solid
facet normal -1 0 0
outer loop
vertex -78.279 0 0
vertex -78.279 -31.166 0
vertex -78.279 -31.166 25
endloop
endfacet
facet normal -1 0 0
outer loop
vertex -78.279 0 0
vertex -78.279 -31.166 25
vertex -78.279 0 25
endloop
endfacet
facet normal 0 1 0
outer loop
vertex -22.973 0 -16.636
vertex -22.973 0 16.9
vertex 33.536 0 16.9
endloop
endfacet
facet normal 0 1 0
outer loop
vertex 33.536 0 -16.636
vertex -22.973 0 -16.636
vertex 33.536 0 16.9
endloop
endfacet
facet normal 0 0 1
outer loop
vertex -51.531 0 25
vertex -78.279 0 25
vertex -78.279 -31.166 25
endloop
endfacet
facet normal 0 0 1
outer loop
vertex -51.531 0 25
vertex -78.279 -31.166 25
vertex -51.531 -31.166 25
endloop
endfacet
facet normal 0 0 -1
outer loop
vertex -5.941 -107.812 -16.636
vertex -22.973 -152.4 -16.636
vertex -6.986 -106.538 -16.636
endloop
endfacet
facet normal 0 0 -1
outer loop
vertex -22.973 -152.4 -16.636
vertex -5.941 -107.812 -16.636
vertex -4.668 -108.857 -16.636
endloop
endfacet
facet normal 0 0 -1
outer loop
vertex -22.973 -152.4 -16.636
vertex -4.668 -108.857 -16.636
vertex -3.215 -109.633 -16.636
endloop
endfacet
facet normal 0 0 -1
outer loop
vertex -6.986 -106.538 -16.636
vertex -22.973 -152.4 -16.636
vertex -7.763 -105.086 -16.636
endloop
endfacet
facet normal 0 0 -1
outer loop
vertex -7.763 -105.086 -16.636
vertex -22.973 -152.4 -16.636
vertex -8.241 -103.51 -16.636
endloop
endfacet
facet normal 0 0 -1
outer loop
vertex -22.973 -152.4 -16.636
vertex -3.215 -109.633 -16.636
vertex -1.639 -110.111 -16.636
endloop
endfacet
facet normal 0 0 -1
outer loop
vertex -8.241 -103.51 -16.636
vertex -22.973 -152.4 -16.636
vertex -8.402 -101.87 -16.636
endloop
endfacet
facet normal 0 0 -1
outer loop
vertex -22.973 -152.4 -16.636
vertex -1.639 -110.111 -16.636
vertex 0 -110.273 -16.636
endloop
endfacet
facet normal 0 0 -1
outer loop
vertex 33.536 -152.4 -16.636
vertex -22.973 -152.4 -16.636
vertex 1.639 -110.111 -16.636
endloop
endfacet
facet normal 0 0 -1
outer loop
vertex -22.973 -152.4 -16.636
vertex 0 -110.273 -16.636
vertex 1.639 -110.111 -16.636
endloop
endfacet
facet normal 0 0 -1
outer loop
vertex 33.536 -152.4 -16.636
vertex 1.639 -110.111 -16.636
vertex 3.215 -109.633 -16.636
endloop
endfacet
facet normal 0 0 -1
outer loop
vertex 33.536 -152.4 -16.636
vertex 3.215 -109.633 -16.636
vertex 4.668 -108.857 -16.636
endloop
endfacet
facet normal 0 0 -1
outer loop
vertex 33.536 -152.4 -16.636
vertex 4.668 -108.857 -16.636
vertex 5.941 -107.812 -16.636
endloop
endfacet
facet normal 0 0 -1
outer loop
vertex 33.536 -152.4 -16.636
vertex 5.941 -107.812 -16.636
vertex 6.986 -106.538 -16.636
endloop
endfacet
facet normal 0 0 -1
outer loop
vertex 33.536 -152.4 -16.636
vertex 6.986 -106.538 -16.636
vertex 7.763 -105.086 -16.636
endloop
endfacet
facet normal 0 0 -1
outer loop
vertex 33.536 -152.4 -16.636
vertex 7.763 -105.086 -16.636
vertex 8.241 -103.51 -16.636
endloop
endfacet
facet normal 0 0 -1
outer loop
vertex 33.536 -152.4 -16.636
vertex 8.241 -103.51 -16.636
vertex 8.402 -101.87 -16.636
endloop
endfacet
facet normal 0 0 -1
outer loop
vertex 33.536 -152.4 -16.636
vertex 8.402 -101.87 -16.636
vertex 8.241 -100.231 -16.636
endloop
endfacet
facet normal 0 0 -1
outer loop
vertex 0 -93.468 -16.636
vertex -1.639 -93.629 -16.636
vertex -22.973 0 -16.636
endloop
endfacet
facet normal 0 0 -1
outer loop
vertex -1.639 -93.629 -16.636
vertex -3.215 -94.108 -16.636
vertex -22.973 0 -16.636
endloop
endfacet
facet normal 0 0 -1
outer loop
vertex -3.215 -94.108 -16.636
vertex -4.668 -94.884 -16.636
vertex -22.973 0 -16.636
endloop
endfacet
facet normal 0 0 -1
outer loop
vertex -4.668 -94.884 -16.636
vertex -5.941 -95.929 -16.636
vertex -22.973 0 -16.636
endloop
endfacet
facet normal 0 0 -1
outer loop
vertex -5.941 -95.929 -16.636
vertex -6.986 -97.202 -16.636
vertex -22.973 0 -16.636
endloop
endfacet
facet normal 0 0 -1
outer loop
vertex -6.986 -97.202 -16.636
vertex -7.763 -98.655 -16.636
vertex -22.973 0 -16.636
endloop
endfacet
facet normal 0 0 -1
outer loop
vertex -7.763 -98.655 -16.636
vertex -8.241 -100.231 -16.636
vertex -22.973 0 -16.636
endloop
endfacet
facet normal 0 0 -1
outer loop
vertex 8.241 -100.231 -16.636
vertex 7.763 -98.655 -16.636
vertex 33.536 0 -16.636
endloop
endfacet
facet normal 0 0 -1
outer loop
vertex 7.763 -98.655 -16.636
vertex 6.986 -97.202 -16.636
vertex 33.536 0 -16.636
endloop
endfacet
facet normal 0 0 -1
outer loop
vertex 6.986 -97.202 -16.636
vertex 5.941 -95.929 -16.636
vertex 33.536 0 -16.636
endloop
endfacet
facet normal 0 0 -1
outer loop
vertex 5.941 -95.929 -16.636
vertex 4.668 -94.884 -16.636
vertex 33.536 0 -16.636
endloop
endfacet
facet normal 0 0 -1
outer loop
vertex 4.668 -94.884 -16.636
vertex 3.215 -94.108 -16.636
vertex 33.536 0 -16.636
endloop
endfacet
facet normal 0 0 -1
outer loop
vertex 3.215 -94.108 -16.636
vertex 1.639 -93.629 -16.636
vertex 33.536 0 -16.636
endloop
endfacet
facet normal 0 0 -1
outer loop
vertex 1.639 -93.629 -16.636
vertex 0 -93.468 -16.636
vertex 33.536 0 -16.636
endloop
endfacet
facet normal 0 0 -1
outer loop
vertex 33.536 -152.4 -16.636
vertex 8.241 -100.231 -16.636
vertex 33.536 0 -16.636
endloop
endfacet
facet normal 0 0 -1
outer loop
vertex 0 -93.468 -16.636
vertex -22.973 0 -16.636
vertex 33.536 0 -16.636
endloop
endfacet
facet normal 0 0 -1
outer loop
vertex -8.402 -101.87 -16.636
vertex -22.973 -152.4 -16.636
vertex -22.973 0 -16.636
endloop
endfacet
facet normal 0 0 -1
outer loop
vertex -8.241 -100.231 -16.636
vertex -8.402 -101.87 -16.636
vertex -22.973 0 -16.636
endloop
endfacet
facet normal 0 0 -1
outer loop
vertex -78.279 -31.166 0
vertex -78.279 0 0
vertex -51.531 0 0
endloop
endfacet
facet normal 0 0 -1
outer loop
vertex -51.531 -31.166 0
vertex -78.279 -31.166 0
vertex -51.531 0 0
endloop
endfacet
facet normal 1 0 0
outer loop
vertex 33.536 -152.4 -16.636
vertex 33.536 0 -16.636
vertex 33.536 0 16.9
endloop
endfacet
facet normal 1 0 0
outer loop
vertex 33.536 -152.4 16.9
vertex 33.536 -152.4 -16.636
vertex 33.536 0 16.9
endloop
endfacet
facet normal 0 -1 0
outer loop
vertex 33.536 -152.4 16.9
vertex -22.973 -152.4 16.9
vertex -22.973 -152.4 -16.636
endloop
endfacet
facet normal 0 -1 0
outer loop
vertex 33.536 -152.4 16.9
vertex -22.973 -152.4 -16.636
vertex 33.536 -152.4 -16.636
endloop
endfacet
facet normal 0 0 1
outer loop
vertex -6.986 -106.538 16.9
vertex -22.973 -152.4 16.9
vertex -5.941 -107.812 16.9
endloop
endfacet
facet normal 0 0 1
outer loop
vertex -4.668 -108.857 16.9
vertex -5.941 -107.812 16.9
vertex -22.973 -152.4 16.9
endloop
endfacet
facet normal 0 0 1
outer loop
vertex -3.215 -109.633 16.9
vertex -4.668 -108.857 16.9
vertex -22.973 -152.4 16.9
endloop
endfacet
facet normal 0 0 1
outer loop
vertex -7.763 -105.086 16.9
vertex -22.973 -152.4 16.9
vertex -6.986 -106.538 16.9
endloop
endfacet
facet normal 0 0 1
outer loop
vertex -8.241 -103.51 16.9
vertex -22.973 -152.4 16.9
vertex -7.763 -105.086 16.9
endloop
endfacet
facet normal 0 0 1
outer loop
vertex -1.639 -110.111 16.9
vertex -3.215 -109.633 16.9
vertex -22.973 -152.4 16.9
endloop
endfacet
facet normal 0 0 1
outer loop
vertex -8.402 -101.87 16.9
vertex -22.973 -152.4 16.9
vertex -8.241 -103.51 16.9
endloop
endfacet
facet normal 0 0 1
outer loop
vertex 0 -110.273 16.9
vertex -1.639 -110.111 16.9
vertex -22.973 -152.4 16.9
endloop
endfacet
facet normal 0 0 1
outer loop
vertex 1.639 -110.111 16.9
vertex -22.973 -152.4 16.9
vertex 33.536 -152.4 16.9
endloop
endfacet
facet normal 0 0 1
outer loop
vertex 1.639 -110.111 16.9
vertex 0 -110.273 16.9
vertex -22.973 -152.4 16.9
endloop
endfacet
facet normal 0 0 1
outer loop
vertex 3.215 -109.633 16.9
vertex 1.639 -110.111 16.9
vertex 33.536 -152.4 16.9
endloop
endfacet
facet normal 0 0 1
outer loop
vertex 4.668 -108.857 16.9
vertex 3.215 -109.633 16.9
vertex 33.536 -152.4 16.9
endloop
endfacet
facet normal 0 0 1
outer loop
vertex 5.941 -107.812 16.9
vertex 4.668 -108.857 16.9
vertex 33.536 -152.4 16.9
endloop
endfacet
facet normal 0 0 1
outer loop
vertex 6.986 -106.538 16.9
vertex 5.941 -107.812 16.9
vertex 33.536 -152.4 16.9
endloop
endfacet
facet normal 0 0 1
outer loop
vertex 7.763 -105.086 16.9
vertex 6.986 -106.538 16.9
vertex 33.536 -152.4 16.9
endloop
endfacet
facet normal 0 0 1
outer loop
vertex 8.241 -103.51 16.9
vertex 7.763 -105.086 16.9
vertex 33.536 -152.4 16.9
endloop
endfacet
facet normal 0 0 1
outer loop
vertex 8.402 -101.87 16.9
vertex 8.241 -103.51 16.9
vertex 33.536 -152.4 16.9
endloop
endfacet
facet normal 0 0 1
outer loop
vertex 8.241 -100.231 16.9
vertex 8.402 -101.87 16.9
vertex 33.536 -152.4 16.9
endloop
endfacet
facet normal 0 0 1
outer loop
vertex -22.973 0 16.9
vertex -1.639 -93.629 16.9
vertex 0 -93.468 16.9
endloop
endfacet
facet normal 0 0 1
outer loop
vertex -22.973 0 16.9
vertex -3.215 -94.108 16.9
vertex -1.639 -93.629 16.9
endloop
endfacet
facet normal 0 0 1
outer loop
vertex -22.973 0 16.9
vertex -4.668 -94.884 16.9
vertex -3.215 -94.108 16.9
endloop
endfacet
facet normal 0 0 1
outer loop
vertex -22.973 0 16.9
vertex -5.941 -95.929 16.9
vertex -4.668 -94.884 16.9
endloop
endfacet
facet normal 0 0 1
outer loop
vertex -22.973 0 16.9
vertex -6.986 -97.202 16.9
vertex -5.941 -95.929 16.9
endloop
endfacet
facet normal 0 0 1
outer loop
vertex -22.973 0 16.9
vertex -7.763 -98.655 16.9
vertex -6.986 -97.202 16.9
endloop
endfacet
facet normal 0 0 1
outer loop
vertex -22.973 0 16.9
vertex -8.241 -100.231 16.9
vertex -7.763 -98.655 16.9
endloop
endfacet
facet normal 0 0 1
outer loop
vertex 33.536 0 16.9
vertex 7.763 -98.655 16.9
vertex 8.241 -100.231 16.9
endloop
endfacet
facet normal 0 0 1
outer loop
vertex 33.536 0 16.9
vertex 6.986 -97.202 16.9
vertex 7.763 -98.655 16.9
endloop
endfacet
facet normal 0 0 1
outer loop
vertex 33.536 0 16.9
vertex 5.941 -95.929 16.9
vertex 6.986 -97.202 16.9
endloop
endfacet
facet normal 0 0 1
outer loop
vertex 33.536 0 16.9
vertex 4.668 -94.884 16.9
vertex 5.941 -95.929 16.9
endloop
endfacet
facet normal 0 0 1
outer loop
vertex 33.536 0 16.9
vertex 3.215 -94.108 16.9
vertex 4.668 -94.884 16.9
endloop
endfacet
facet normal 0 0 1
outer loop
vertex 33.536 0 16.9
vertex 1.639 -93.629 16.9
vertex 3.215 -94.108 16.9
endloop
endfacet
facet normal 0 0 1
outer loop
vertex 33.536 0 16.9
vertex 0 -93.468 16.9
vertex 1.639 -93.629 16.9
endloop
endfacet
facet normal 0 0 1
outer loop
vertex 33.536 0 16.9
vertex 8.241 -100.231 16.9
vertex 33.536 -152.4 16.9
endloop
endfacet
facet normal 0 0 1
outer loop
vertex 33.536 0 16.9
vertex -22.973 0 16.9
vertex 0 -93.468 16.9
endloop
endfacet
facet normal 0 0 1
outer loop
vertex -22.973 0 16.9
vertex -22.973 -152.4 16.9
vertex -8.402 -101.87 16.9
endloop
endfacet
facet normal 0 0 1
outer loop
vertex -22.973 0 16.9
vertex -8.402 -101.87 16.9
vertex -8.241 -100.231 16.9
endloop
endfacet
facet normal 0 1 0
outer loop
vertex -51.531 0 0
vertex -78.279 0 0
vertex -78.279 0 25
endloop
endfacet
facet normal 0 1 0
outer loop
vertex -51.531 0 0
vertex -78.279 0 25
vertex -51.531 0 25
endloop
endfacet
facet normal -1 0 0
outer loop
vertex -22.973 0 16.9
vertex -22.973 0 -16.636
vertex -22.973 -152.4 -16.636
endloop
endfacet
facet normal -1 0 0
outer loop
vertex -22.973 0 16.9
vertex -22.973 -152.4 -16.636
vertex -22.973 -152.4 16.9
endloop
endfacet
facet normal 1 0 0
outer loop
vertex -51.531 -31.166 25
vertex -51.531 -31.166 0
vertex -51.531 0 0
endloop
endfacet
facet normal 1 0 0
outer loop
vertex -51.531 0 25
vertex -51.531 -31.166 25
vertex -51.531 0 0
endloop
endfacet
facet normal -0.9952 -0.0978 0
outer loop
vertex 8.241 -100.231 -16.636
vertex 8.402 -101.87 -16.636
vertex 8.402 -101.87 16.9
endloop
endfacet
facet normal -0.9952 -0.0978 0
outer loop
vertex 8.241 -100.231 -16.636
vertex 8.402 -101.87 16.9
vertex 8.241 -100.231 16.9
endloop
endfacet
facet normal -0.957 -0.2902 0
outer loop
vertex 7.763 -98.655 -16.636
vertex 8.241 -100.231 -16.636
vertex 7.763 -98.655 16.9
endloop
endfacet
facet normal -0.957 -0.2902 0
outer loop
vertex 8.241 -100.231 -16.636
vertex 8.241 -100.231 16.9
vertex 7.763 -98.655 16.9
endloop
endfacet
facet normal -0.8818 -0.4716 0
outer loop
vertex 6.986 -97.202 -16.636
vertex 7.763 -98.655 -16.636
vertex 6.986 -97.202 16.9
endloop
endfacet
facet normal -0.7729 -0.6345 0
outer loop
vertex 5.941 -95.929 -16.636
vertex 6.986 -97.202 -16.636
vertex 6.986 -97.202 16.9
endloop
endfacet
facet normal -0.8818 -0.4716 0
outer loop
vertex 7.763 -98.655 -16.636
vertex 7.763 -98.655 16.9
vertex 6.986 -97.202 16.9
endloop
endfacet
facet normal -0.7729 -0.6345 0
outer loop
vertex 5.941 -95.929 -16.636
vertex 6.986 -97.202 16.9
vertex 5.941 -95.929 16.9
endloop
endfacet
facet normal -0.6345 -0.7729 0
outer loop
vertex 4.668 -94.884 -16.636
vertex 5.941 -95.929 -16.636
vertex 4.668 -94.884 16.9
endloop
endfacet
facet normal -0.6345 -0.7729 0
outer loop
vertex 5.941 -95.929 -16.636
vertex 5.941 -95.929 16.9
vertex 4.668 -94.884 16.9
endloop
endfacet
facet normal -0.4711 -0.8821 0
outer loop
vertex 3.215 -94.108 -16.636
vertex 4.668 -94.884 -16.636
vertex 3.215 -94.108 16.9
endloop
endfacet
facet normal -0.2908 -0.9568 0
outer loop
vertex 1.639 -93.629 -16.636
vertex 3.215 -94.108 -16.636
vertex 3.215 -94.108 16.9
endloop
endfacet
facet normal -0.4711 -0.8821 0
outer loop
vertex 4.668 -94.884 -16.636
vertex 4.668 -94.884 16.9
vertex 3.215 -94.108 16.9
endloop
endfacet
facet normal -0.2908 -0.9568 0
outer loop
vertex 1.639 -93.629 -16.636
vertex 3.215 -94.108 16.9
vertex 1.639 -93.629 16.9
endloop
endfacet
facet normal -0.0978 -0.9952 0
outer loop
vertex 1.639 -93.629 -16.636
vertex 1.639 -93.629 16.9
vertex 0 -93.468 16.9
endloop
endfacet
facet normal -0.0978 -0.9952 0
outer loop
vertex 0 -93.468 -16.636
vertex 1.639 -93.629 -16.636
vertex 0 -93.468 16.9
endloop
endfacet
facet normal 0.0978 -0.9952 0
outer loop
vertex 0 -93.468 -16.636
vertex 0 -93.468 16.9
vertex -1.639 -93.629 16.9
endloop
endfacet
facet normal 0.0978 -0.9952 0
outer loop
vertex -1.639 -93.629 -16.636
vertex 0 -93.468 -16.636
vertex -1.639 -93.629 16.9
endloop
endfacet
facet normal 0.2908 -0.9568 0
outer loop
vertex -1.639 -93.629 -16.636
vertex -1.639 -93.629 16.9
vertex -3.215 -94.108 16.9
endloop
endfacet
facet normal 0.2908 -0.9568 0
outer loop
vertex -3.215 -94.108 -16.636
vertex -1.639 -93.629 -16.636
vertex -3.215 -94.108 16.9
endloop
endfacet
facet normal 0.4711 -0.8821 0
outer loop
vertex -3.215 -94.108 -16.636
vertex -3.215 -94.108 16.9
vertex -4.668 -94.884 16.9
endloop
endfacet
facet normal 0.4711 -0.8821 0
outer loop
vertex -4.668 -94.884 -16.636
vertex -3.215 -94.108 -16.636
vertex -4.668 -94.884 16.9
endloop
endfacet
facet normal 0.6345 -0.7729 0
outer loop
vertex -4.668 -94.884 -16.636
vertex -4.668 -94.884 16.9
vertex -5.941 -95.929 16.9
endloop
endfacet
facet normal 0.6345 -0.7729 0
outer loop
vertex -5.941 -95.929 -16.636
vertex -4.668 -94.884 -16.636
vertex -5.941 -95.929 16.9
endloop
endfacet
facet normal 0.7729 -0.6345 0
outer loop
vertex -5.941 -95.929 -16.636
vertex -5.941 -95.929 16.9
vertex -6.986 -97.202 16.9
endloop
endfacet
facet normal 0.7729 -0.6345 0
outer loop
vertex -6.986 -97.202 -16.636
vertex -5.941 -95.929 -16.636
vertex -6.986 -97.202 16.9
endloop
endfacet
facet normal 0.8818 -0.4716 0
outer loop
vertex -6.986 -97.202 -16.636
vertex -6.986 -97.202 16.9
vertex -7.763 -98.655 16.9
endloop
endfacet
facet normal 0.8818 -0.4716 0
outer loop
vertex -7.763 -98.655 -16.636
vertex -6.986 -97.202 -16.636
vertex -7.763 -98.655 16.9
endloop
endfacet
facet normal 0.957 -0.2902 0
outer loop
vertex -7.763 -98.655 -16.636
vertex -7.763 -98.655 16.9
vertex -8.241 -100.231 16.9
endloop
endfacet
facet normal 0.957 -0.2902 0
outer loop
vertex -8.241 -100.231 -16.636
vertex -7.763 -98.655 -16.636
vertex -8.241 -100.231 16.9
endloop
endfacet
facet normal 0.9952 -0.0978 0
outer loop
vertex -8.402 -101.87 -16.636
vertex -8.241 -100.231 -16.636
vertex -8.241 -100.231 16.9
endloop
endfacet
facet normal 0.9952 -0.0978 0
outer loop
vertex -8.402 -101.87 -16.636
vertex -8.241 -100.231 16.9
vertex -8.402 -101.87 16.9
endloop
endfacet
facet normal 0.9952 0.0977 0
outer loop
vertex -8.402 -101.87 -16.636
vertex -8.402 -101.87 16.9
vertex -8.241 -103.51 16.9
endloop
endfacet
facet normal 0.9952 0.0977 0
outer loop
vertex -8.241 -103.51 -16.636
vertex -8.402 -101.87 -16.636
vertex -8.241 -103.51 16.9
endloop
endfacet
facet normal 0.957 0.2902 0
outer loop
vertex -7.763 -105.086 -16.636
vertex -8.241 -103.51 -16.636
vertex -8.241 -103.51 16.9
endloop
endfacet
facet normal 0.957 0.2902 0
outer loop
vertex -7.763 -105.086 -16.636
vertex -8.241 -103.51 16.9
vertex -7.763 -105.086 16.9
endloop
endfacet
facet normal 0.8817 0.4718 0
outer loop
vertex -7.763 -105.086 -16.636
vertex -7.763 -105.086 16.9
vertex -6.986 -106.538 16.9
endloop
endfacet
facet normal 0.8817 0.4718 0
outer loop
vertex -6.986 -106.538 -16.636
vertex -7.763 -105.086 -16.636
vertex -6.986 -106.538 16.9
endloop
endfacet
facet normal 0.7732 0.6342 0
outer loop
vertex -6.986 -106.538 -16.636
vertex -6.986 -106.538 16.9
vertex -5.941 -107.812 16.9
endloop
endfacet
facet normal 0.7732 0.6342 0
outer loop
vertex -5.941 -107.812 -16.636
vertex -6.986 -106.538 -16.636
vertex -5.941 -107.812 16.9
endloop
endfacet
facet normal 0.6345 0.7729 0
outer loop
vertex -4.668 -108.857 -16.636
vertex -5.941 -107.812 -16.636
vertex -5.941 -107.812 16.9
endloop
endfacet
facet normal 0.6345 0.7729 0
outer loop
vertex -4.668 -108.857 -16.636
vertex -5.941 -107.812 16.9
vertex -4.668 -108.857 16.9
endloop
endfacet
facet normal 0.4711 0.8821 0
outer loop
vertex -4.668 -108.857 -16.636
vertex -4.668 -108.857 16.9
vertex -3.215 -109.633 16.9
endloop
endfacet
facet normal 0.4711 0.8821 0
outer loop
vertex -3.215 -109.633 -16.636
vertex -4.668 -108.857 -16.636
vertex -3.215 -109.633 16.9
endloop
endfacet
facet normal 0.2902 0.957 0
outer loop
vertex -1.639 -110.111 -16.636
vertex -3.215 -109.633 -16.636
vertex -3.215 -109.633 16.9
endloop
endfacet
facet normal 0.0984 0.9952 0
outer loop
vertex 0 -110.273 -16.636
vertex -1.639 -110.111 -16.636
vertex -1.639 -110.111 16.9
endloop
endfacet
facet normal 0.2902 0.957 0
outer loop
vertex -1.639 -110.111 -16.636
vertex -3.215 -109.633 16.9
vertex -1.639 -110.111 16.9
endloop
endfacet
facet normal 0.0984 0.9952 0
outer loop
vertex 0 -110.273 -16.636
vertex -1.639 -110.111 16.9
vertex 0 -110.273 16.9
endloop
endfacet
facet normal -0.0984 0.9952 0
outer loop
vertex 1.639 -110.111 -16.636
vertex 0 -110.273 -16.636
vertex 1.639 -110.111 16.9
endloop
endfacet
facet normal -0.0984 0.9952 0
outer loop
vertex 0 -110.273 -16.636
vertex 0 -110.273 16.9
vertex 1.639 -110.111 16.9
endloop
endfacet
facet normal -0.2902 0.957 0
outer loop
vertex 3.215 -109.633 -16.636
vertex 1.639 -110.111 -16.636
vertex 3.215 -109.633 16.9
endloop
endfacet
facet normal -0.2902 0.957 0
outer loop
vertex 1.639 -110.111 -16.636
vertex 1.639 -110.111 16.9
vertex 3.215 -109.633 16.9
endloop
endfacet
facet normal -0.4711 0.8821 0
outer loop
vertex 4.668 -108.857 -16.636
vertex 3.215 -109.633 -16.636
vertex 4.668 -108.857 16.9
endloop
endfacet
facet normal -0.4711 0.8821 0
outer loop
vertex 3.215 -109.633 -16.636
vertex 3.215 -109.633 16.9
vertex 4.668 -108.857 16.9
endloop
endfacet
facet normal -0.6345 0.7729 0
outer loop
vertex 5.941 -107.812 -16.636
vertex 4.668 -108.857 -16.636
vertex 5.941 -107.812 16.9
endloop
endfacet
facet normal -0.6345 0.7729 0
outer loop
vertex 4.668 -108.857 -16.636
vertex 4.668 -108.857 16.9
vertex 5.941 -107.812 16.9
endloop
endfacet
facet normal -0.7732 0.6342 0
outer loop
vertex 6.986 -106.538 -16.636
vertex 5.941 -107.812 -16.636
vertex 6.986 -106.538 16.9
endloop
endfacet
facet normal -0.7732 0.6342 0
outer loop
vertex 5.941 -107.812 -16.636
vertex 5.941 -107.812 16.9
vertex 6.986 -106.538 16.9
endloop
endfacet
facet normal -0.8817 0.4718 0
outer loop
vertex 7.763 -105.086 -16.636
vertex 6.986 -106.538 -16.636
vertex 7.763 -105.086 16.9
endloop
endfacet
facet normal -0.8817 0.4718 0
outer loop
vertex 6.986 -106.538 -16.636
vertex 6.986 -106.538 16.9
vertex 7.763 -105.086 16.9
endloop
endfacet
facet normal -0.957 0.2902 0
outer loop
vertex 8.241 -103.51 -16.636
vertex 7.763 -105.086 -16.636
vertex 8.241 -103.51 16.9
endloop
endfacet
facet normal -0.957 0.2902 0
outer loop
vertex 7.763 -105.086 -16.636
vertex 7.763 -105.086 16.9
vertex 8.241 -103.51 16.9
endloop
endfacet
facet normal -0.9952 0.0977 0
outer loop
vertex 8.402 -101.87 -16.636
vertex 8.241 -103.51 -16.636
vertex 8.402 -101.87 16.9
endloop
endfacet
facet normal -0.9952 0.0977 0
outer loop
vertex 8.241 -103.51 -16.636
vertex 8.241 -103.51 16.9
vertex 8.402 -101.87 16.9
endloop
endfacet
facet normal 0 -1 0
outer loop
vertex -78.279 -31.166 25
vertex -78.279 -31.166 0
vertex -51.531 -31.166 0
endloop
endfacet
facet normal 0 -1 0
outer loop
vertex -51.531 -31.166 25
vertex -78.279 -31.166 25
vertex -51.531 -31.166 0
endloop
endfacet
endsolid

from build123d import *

# Parameters (mm, degrees)
F0_W     = 56.508717
F0_H     = 33.535544
F1_DEPTH = 152.4
F2_R     = 8.402321
F3_DEPTH = 63.754
F4_W     = 26.747964
F4_H     = 31.165645
F5_DEPTH = 25


with BuildPart() as f1:
    # F0 (on Front) → F1 (new body)
    with BuildSketch(Plane.XZ):
        with Locations((5.281189, 0.13203)):
            Rectangle(F0_W, F0_H)
    extrude(amount=F1_DEPTH)

    # F2 (on face) → F3 (cut)
    with BuildSketch(Plane.XY.offset(16.899802)):
        with Locations((0, -101.870343)):
            Circle(F2_R)
    extrude(amount=-F3_DEPTH, mode=Mode.SUBTRACT)


with BuildPart() as f5:
    # F4 (on Top) → F5 (new body)
    with BuildSketch(Plane.XY):
        with Locations((-64.904783, -15.582822)):
            Rectangle(F4_W, F4_H)
    extrude(amount=F5_DEPTH)


solid = Compound([f1.part, f5.part])
